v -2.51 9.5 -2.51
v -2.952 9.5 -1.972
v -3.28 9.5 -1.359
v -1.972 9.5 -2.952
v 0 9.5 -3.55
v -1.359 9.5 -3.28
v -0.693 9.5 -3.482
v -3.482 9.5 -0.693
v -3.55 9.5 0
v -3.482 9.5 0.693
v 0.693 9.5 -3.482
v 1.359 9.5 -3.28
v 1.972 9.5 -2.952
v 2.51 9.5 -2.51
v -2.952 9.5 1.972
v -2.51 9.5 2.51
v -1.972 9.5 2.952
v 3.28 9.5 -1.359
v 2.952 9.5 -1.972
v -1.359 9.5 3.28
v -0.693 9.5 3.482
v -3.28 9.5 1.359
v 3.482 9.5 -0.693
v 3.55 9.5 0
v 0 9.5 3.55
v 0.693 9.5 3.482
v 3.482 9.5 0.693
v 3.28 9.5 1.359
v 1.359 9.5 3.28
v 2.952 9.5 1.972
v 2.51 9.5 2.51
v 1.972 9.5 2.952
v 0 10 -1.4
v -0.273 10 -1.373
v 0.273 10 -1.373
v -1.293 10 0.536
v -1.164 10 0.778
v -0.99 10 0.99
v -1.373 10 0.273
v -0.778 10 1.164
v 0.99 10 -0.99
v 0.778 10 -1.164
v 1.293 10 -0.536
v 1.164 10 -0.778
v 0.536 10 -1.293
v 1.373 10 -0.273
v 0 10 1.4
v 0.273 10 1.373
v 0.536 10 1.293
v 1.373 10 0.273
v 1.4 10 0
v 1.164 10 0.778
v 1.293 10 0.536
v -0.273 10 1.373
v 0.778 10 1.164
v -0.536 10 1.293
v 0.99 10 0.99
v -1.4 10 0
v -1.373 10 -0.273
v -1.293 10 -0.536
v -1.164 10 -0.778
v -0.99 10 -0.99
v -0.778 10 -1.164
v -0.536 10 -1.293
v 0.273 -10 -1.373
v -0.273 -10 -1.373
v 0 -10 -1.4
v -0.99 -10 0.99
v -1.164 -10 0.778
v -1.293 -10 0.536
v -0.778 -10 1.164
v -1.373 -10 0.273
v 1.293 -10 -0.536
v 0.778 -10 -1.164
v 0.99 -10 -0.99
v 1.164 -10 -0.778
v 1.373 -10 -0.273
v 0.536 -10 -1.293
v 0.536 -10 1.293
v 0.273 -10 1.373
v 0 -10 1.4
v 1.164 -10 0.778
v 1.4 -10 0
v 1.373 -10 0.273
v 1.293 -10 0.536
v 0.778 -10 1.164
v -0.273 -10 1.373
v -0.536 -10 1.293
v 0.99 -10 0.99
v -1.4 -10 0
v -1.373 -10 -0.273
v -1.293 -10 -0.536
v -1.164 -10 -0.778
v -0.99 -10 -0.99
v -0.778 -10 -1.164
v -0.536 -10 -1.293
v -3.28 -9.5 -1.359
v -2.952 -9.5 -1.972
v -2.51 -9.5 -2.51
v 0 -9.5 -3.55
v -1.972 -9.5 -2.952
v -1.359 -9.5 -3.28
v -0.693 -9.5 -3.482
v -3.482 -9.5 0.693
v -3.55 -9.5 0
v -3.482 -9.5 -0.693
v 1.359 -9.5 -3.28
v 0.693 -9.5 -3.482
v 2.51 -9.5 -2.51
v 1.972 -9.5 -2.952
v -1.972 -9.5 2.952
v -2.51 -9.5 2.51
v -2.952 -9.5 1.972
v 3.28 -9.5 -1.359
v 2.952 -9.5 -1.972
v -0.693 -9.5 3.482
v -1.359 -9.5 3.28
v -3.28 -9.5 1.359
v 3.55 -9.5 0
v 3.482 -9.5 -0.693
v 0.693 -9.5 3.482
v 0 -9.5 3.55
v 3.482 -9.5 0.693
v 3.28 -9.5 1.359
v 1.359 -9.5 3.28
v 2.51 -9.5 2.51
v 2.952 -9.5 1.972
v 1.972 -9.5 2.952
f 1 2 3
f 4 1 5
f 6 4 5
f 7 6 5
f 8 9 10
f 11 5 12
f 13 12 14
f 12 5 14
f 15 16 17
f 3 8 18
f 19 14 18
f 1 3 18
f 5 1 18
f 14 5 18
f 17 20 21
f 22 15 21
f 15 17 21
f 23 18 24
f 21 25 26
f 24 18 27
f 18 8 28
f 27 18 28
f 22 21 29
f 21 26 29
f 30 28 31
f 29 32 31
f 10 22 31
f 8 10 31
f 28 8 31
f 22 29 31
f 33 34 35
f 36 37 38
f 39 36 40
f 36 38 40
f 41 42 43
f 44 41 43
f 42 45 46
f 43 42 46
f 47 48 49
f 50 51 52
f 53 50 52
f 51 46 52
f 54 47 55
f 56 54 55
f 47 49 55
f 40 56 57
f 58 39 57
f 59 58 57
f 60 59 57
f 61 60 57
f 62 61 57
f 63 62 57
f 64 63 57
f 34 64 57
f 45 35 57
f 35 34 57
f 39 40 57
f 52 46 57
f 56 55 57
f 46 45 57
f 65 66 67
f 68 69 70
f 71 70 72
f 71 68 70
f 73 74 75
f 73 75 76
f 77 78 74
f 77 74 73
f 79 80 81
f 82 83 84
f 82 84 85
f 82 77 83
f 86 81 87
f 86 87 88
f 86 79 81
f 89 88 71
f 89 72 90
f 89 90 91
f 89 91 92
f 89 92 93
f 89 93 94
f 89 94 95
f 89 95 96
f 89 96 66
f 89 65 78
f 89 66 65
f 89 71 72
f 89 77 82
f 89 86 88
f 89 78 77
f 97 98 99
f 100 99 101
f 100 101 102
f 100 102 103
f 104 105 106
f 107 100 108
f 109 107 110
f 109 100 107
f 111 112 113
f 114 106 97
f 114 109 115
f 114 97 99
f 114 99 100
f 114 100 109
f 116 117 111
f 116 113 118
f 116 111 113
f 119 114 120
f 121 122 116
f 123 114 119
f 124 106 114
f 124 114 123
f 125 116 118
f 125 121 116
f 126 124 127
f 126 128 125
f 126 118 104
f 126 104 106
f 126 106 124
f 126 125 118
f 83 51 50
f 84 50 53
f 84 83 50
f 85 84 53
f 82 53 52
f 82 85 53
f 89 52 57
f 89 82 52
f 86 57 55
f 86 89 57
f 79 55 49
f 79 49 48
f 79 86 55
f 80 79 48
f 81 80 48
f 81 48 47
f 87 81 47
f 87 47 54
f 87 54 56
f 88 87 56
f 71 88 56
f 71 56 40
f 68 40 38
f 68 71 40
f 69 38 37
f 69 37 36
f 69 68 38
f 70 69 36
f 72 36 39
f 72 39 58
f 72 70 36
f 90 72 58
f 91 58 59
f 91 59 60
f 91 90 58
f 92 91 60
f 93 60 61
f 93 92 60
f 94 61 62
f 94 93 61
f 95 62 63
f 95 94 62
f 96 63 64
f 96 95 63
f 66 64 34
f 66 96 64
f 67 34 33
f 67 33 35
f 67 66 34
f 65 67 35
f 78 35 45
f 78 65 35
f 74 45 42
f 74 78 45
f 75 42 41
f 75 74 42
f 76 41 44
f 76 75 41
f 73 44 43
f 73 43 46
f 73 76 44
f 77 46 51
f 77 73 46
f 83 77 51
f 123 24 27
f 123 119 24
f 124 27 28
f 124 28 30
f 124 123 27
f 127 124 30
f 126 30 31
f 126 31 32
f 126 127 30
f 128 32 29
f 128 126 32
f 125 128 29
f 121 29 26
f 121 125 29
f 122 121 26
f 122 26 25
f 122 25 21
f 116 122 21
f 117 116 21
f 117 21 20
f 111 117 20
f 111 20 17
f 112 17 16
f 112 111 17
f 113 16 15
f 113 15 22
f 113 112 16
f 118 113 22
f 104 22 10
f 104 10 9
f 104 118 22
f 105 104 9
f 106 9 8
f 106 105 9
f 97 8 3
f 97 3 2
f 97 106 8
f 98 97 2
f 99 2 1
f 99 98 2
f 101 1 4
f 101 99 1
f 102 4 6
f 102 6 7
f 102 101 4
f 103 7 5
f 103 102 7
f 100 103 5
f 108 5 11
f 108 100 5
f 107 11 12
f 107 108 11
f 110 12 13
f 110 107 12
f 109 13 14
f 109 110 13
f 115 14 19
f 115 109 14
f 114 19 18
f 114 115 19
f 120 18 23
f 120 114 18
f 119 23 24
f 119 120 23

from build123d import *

# Parameters (mm, degrees)
F0_R     = 3.55
F1_DEPTH = 9.5
F2_R     = 1.4
F3_DEPTH = 10
F4_W     = 10
F4_H     = 10
F5_DEPTH = 10


with BuildPart() as f1:
    # F0 (on Front) → F1 (new body, symmetric)
    with BuildSketch(Plane.XZ):
        Circle(F0_R)
    extrude(amount=F1_DEPTH, both=True)


with BuildPart() as f3:
    # F2 (on Front) → F3 (new body, symmetric)
    with BuildSketch(Plane.XZ):
        Circle(F2_R)
    extrude(amount=F3_DEPTH, both=True)


with BuildPart() as f5:
    # F4 (on Front) → F5 (new body)
    with BuildSketch(Plane.XZ):
        with Locations((5, 5)):
            Rectangle(F4_W, F4_H)
    extrude(amount=F5_DEPTH)


solid = Compound([f1.part, f3.part])
